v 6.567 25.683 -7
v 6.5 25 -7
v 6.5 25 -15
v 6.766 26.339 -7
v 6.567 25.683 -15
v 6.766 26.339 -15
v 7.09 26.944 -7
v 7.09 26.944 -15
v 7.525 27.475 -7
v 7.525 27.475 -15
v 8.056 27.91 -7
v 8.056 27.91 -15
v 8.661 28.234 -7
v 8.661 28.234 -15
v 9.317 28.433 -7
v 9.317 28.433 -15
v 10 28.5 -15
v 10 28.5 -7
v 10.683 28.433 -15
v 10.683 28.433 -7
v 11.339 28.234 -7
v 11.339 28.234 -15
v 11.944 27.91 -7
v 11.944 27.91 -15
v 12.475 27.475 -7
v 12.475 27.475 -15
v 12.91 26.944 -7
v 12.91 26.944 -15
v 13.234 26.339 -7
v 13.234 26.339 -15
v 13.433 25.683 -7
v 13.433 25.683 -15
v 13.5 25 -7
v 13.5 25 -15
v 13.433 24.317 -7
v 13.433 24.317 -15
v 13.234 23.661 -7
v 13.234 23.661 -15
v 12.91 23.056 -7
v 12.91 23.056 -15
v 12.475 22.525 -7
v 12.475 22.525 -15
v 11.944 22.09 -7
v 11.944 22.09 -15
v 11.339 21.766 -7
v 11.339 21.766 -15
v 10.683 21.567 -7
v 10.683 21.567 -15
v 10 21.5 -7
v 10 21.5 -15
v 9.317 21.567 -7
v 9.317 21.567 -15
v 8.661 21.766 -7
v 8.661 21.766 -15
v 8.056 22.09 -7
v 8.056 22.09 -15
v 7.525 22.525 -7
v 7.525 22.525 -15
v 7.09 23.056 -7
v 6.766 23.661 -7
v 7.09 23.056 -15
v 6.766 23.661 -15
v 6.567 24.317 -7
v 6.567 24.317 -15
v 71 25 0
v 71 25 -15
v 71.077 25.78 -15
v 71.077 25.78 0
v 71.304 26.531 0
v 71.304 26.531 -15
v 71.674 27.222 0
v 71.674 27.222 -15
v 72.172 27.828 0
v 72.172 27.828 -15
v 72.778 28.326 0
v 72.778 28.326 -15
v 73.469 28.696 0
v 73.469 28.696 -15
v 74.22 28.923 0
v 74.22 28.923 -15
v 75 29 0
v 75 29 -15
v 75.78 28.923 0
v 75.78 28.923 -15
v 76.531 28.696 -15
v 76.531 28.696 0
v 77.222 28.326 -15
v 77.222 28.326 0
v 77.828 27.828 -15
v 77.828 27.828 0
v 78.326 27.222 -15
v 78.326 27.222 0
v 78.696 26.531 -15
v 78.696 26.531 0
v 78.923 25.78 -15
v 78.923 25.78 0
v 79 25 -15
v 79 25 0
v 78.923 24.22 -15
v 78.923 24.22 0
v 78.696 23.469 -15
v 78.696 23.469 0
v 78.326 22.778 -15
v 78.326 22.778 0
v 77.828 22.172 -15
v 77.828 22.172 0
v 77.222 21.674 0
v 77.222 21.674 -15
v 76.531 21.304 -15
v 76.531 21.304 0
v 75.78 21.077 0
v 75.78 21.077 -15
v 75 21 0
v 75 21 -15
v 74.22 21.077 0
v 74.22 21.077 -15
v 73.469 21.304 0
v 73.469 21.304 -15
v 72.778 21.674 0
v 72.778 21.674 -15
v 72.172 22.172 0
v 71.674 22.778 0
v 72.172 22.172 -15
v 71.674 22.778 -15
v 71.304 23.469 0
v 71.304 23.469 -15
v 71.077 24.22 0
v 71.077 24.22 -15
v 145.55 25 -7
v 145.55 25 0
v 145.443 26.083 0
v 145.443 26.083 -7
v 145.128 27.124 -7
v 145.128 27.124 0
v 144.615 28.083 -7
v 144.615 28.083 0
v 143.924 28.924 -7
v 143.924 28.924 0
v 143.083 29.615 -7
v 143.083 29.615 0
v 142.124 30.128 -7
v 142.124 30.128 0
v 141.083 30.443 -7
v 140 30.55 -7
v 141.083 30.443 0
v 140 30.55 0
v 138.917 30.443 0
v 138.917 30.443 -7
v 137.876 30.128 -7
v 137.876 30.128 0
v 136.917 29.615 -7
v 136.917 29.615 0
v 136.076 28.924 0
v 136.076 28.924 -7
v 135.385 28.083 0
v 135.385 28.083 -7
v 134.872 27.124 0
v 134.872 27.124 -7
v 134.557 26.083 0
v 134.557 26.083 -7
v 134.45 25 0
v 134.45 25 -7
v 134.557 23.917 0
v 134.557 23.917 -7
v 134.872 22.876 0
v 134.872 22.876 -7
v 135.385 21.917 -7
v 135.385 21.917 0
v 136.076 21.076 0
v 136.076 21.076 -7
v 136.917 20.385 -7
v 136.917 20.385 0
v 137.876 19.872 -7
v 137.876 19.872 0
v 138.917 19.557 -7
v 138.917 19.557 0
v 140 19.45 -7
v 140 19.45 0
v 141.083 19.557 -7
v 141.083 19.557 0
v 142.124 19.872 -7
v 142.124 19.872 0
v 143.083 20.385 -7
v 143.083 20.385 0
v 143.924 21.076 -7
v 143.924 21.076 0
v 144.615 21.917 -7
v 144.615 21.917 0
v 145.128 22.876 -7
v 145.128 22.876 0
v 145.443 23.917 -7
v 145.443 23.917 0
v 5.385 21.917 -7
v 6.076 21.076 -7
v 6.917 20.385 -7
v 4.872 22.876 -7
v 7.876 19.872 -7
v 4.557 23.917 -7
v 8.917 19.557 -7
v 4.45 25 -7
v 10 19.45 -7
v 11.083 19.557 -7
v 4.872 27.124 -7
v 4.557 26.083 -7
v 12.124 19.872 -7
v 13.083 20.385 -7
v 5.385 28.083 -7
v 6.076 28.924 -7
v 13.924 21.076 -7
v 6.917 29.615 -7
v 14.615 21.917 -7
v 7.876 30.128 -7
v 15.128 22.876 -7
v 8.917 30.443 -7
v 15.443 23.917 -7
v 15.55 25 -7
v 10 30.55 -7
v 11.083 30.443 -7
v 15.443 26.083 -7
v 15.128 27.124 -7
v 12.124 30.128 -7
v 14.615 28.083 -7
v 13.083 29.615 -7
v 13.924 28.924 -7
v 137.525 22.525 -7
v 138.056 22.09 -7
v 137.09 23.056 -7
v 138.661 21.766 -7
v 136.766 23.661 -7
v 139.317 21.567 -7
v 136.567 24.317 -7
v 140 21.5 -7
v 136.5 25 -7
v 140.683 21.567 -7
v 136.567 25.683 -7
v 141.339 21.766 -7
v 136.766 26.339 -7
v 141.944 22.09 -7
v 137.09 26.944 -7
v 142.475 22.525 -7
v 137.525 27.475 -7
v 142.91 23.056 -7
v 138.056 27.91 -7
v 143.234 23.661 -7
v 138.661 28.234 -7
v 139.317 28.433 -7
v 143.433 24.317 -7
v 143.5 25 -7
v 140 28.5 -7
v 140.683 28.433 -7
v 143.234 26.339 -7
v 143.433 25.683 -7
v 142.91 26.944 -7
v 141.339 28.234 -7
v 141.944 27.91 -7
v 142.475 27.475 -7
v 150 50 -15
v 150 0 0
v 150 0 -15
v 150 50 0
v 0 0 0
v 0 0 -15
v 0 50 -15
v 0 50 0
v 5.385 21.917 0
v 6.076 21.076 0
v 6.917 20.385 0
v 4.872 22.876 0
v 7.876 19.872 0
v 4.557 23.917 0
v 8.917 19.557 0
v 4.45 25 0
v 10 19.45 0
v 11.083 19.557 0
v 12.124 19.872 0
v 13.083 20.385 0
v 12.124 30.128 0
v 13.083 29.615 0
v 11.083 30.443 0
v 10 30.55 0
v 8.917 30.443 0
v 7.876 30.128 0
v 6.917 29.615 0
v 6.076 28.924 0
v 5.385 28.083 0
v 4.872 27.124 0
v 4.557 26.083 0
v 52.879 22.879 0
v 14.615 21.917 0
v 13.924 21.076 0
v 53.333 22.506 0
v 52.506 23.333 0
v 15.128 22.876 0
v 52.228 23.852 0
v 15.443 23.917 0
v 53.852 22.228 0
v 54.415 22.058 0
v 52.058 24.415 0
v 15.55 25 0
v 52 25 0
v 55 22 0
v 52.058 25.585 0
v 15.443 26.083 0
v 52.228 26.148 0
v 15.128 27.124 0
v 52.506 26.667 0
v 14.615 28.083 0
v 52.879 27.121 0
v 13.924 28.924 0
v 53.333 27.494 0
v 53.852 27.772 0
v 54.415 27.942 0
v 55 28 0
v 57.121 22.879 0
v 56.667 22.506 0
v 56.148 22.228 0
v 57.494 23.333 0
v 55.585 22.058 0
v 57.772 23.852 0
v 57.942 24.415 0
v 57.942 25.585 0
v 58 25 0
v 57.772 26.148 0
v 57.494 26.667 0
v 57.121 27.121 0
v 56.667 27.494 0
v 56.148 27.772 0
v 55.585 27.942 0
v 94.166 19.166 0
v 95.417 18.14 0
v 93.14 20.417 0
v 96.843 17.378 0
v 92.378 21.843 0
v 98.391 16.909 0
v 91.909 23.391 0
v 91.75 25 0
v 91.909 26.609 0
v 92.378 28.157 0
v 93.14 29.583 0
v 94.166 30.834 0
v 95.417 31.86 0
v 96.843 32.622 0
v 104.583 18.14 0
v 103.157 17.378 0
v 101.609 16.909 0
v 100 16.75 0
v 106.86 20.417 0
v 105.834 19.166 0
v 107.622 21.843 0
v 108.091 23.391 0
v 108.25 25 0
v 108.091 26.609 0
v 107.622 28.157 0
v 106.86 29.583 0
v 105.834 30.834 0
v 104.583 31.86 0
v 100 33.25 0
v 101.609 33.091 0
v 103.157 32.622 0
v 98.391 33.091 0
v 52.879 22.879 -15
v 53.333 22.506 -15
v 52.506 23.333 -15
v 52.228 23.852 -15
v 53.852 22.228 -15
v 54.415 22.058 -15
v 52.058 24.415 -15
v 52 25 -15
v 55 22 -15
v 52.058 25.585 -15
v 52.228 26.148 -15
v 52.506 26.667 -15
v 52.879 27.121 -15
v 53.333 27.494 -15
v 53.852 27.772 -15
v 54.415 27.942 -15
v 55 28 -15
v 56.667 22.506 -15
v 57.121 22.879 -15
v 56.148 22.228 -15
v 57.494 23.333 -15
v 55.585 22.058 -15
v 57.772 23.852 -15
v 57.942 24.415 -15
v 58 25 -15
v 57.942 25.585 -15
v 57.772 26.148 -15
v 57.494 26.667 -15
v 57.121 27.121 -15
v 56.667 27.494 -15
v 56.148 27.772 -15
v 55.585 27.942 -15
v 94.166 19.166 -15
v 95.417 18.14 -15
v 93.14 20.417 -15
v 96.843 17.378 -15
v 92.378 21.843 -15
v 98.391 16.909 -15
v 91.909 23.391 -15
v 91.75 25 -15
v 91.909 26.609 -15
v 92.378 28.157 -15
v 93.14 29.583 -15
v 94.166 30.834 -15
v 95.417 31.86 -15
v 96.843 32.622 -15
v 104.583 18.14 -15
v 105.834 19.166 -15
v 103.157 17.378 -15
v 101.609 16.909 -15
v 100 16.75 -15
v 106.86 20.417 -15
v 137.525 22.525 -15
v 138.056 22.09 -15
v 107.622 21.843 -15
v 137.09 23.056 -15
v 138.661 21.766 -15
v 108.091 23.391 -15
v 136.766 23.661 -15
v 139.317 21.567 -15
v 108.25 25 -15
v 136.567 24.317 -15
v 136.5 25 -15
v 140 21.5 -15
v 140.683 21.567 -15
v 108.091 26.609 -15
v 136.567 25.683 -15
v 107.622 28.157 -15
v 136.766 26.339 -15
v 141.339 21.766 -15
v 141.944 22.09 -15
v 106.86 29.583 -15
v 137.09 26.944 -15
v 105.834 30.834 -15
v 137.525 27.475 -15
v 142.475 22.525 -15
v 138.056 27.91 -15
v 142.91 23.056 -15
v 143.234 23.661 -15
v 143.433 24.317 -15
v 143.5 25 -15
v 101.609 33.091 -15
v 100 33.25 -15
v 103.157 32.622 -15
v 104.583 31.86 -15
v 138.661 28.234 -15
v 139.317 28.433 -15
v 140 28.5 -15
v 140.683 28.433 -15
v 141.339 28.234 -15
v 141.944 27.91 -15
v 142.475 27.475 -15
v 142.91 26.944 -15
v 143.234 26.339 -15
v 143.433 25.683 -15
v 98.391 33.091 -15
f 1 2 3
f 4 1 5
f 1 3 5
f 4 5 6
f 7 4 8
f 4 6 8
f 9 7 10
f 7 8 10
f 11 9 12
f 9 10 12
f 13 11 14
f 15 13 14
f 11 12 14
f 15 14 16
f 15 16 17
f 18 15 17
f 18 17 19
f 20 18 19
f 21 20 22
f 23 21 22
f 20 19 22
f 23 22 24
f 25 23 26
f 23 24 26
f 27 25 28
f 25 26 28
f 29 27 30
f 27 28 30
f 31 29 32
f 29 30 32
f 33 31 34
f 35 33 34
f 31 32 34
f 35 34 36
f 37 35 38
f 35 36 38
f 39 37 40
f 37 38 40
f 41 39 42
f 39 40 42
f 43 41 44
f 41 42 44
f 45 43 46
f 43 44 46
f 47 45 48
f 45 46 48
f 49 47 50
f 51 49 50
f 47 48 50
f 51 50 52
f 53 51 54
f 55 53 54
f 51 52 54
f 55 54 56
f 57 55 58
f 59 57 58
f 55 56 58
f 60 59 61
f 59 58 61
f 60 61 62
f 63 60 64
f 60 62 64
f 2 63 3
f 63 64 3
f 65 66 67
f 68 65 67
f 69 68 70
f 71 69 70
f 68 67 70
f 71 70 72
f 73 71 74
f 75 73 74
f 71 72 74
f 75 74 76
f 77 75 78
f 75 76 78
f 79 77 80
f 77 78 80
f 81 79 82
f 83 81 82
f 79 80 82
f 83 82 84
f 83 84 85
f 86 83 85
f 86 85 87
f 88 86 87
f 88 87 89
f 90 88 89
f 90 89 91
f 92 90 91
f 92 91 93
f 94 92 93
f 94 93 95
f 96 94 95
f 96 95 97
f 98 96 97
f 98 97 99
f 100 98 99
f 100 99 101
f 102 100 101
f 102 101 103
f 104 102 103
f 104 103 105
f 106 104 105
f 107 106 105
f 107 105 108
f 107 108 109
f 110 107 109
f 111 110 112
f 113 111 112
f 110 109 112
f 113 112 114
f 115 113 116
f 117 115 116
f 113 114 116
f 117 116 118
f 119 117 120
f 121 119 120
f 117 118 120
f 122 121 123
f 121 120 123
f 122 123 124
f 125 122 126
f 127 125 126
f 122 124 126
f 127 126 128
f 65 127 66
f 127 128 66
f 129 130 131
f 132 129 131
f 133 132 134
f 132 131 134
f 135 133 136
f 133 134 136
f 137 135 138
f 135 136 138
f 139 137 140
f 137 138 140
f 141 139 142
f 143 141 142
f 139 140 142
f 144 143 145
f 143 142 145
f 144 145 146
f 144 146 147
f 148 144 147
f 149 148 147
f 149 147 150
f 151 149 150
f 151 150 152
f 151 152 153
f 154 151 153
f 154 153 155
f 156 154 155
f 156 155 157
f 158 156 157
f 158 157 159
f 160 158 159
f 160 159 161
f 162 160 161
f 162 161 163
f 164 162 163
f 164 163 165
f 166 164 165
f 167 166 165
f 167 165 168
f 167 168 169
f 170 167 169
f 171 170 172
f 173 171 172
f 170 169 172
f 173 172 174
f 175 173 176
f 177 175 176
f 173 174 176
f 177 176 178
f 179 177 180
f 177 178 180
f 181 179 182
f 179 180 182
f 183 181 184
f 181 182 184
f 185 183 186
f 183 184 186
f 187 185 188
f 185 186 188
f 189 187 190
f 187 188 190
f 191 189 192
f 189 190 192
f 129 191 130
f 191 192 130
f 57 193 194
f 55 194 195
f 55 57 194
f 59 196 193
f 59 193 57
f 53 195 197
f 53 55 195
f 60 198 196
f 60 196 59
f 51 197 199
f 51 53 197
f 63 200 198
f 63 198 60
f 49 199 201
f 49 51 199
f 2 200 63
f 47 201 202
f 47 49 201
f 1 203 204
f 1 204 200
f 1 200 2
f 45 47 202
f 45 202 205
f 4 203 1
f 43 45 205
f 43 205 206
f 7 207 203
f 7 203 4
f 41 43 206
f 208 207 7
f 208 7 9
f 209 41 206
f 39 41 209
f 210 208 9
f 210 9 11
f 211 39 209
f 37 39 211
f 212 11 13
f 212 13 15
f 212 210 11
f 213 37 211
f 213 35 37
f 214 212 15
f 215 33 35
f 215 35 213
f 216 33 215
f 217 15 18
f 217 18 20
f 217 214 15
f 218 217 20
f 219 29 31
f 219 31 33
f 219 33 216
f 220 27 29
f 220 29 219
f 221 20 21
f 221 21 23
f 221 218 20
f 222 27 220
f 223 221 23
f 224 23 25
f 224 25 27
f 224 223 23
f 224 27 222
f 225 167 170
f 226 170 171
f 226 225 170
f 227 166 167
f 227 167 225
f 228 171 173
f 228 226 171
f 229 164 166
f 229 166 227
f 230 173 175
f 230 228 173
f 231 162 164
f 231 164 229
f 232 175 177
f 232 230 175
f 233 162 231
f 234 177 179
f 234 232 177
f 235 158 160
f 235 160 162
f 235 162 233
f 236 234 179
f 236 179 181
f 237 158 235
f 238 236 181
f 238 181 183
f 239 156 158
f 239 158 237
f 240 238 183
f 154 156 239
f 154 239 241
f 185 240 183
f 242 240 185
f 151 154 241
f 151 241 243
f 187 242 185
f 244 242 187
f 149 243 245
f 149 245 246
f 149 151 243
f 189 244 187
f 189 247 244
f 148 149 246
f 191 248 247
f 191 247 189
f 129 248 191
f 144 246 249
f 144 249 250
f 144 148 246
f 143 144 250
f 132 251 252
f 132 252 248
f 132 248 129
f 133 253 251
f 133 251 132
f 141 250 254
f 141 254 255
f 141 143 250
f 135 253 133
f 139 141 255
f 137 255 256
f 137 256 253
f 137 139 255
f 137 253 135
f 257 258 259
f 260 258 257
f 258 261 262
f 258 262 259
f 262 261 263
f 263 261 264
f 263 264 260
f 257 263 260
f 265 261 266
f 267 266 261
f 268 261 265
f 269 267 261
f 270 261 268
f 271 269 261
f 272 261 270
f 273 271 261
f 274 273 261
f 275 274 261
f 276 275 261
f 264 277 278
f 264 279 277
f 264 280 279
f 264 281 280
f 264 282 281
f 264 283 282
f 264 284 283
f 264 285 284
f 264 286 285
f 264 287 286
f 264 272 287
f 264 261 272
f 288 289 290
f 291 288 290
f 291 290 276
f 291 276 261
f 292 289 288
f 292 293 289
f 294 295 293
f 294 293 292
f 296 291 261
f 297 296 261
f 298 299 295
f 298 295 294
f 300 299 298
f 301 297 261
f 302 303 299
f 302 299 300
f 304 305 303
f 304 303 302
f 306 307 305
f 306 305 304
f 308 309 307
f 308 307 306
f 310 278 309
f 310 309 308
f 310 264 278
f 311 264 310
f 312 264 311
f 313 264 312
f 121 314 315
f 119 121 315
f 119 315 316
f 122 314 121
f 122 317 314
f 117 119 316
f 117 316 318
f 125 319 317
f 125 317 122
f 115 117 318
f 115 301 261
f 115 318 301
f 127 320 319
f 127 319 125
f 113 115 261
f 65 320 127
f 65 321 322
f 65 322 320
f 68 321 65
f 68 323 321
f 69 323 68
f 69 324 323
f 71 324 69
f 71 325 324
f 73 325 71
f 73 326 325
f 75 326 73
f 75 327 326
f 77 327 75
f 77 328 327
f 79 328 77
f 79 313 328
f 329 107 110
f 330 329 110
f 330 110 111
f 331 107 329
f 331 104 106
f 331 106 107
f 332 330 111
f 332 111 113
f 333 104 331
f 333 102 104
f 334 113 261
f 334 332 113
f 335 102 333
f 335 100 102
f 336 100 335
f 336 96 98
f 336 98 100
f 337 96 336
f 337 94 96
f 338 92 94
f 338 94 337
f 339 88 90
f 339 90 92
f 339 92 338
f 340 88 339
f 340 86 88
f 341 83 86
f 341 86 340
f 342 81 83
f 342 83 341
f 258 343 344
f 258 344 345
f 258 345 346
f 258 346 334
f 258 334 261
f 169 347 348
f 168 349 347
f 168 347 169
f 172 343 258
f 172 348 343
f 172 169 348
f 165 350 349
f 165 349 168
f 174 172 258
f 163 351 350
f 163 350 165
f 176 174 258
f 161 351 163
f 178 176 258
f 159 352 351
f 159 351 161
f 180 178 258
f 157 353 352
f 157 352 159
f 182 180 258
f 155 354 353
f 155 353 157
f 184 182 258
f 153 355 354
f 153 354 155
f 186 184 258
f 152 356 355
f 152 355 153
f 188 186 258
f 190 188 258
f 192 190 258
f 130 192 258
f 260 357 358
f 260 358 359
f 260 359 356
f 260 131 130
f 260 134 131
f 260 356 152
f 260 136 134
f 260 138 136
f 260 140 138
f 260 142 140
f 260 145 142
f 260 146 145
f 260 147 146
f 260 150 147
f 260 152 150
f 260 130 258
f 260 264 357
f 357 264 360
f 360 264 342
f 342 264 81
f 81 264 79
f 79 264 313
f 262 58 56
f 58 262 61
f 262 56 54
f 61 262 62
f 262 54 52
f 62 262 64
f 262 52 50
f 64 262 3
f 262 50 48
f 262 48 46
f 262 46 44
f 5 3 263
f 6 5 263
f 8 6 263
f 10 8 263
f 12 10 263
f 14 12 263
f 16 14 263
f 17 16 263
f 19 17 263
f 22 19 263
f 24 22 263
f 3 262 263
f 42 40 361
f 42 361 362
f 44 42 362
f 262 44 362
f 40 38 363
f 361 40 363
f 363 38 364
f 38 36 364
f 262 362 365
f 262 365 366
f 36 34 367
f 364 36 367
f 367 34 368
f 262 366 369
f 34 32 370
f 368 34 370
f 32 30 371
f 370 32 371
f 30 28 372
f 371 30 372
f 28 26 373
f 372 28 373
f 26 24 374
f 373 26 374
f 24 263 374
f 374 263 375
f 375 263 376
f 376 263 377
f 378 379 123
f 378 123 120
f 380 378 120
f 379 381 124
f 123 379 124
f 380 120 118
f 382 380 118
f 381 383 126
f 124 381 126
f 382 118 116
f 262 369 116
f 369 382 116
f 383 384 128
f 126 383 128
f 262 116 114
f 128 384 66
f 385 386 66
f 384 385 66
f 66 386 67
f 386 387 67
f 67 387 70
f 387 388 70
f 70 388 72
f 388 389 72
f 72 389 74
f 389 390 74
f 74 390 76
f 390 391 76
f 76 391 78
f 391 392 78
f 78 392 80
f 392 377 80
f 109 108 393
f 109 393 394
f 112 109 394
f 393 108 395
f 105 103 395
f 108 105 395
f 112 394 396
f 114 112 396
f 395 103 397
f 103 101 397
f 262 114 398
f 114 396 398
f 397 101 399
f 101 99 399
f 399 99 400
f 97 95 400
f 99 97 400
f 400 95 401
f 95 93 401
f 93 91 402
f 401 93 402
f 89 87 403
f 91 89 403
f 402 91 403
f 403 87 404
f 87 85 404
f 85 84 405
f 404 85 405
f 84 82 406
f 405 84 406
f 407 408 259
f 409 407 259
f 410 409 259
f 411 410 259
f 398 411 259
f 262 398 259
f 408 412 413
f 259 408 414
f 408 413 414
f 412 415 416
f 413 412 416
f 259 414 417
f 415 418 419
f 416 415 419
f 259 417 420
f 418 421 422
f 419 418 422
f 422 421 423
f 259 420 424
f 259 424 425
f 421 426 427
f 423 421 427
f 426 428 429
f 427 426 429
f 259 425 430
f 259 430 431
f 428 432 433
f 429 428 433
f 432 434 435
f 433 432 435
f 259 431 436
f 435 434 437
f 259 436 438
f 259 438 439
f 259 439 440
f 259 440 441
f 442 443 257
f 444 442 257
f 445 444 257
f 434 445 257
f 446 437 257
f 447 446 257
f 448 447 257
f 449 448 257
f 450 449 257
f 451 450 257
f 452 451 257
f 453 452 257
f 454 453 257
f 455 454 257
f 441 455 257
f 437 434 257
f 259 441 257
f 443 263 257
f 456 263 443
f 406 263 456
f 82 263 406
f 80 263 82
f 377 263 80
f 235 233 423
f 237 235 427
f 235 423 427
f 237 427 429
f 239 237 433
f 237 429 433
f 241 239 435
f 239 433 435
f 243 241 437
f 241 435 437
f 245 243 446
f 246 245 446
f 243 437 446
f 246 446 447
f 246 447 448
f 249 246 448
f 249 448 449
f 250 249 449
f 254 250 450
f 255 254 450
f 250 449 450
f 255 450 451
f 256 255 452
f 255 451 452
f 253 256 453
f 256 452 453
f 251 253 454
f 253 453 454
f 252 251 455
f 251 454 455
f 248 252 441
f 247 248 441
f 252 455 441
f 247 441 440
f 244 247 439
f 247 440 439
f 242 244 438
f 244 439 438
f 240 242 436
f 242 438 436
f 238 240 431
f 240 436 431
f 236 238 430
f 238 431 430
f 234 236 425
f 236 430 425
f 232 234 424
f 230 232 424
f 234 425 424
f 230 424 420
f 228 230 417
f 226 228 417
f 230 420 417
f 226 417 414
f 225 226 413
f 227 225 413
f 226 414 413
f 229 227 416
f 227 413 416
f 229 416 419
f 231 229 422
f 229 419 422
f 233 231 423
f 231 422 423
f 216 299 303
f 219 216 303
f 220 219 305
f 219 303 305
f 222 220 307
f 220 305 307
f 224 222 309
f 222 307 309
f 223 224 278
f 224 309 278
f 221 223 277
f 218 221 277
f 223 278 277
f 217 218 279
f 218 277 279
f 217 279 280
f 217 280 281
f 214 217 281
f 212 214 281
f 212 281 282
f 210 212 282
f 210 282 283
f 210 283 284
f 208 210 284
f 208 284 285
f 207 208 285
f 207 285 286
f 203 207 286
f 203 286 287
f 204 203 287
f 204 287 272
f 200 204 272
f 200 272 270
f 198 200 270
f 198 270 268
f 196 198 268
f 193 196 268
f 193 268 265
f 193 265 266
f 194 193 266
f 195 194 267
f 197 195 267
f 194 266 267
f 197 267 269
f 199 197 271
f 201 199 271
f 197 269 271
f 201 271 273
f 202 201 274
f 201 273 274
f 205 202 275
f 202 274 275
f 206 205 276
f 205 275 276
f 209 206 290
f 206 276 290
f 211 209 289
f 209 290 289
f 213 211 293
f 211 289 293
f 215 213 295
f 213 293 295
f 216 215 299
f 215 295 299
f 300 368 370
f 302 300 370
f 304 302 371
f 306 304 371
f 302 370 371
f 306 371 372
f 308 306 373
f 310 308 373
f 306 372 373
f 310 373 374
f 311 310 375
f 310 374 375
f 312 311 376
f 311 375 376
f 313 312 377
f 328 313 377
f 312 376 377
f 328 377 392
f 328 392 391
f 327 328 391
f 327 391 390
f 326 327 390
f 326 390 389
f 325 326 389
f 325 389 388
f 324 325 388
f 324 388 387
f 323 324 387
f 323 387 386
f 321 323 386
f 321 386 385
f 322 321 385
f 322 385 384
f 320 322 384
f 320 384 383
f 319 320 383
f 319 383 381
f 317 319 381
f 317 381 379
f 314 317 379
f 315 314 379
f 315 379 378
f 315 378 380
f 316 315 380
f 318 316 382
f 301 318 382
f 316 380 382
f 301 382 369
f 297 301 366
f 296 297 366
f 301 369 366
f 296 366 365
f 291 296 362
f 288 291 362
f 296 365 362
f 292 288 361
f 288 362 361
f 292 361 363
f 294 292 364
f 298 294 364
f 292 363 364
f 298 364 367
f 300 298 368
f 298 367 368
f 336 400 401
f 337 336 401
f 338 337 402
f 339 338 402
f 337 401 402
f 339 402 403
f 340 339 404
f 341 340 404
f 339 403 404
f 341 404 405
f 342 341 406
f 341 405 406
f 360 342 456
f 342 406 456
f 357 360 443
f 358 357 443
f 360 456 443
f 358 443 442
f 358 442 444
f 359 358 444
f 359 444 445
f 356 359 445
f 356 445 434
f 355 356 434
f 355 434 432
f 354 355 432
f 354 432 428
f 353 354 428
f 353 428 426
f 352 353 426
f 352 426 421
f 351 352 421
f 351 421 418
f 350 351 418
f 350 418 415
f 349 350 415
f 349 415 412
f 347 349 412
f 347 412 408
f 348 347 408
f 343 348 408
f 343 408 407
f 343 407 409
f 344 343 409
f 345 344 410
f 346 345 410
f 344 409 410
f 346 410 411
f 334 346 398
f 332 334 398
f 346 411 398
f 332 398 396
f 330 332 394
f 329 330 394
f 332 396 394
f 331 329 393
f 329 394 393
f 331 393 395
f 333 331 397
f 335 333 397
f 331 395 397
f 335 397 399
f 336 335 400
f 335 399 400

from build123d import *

# Parameters (mm, degrees)
F0_W           = 150
F0_H           = 50
F1_DEPTH       = 15
F3_D           = 7
F3_CBORE_D     = 11.1
F3_CBORE_DEPTH = 7
F4_D           = 6
F5_D           = 8
F6_D           = 16.5


with BuildPart() as f1:
    # F0 (on Top) → F1 (new body)
    with BuildSketch(Plane.XY):
        with Locations((75, 25)):
            Rectangle(F0_W, F0_H)
    extrude(amount=-F1_DEPTH)

    # F3 (through all)
    with Locations(Plane.XY):
        with Locations((10, 25), (140, 25)):
            CounterBoreHole(F3_D / 2, F3_CBORE_D / 2, F3_CBORE_DEPTH)

    # F4 (through all)
    with Locations(Plane.XY):
        with Locations((55, 25)):
            Hole(F4_D / 2)

    # F5 (through all)
    with Locations(Plane.XY):
        with Locations((75, 25)):
            Hole(F5_D / 2)

    # F6 (through all)
    with Locations(Plane.XY):
        with Locations((100, 25)):
            Hole(F6_D / 2)


solid = f1.part
